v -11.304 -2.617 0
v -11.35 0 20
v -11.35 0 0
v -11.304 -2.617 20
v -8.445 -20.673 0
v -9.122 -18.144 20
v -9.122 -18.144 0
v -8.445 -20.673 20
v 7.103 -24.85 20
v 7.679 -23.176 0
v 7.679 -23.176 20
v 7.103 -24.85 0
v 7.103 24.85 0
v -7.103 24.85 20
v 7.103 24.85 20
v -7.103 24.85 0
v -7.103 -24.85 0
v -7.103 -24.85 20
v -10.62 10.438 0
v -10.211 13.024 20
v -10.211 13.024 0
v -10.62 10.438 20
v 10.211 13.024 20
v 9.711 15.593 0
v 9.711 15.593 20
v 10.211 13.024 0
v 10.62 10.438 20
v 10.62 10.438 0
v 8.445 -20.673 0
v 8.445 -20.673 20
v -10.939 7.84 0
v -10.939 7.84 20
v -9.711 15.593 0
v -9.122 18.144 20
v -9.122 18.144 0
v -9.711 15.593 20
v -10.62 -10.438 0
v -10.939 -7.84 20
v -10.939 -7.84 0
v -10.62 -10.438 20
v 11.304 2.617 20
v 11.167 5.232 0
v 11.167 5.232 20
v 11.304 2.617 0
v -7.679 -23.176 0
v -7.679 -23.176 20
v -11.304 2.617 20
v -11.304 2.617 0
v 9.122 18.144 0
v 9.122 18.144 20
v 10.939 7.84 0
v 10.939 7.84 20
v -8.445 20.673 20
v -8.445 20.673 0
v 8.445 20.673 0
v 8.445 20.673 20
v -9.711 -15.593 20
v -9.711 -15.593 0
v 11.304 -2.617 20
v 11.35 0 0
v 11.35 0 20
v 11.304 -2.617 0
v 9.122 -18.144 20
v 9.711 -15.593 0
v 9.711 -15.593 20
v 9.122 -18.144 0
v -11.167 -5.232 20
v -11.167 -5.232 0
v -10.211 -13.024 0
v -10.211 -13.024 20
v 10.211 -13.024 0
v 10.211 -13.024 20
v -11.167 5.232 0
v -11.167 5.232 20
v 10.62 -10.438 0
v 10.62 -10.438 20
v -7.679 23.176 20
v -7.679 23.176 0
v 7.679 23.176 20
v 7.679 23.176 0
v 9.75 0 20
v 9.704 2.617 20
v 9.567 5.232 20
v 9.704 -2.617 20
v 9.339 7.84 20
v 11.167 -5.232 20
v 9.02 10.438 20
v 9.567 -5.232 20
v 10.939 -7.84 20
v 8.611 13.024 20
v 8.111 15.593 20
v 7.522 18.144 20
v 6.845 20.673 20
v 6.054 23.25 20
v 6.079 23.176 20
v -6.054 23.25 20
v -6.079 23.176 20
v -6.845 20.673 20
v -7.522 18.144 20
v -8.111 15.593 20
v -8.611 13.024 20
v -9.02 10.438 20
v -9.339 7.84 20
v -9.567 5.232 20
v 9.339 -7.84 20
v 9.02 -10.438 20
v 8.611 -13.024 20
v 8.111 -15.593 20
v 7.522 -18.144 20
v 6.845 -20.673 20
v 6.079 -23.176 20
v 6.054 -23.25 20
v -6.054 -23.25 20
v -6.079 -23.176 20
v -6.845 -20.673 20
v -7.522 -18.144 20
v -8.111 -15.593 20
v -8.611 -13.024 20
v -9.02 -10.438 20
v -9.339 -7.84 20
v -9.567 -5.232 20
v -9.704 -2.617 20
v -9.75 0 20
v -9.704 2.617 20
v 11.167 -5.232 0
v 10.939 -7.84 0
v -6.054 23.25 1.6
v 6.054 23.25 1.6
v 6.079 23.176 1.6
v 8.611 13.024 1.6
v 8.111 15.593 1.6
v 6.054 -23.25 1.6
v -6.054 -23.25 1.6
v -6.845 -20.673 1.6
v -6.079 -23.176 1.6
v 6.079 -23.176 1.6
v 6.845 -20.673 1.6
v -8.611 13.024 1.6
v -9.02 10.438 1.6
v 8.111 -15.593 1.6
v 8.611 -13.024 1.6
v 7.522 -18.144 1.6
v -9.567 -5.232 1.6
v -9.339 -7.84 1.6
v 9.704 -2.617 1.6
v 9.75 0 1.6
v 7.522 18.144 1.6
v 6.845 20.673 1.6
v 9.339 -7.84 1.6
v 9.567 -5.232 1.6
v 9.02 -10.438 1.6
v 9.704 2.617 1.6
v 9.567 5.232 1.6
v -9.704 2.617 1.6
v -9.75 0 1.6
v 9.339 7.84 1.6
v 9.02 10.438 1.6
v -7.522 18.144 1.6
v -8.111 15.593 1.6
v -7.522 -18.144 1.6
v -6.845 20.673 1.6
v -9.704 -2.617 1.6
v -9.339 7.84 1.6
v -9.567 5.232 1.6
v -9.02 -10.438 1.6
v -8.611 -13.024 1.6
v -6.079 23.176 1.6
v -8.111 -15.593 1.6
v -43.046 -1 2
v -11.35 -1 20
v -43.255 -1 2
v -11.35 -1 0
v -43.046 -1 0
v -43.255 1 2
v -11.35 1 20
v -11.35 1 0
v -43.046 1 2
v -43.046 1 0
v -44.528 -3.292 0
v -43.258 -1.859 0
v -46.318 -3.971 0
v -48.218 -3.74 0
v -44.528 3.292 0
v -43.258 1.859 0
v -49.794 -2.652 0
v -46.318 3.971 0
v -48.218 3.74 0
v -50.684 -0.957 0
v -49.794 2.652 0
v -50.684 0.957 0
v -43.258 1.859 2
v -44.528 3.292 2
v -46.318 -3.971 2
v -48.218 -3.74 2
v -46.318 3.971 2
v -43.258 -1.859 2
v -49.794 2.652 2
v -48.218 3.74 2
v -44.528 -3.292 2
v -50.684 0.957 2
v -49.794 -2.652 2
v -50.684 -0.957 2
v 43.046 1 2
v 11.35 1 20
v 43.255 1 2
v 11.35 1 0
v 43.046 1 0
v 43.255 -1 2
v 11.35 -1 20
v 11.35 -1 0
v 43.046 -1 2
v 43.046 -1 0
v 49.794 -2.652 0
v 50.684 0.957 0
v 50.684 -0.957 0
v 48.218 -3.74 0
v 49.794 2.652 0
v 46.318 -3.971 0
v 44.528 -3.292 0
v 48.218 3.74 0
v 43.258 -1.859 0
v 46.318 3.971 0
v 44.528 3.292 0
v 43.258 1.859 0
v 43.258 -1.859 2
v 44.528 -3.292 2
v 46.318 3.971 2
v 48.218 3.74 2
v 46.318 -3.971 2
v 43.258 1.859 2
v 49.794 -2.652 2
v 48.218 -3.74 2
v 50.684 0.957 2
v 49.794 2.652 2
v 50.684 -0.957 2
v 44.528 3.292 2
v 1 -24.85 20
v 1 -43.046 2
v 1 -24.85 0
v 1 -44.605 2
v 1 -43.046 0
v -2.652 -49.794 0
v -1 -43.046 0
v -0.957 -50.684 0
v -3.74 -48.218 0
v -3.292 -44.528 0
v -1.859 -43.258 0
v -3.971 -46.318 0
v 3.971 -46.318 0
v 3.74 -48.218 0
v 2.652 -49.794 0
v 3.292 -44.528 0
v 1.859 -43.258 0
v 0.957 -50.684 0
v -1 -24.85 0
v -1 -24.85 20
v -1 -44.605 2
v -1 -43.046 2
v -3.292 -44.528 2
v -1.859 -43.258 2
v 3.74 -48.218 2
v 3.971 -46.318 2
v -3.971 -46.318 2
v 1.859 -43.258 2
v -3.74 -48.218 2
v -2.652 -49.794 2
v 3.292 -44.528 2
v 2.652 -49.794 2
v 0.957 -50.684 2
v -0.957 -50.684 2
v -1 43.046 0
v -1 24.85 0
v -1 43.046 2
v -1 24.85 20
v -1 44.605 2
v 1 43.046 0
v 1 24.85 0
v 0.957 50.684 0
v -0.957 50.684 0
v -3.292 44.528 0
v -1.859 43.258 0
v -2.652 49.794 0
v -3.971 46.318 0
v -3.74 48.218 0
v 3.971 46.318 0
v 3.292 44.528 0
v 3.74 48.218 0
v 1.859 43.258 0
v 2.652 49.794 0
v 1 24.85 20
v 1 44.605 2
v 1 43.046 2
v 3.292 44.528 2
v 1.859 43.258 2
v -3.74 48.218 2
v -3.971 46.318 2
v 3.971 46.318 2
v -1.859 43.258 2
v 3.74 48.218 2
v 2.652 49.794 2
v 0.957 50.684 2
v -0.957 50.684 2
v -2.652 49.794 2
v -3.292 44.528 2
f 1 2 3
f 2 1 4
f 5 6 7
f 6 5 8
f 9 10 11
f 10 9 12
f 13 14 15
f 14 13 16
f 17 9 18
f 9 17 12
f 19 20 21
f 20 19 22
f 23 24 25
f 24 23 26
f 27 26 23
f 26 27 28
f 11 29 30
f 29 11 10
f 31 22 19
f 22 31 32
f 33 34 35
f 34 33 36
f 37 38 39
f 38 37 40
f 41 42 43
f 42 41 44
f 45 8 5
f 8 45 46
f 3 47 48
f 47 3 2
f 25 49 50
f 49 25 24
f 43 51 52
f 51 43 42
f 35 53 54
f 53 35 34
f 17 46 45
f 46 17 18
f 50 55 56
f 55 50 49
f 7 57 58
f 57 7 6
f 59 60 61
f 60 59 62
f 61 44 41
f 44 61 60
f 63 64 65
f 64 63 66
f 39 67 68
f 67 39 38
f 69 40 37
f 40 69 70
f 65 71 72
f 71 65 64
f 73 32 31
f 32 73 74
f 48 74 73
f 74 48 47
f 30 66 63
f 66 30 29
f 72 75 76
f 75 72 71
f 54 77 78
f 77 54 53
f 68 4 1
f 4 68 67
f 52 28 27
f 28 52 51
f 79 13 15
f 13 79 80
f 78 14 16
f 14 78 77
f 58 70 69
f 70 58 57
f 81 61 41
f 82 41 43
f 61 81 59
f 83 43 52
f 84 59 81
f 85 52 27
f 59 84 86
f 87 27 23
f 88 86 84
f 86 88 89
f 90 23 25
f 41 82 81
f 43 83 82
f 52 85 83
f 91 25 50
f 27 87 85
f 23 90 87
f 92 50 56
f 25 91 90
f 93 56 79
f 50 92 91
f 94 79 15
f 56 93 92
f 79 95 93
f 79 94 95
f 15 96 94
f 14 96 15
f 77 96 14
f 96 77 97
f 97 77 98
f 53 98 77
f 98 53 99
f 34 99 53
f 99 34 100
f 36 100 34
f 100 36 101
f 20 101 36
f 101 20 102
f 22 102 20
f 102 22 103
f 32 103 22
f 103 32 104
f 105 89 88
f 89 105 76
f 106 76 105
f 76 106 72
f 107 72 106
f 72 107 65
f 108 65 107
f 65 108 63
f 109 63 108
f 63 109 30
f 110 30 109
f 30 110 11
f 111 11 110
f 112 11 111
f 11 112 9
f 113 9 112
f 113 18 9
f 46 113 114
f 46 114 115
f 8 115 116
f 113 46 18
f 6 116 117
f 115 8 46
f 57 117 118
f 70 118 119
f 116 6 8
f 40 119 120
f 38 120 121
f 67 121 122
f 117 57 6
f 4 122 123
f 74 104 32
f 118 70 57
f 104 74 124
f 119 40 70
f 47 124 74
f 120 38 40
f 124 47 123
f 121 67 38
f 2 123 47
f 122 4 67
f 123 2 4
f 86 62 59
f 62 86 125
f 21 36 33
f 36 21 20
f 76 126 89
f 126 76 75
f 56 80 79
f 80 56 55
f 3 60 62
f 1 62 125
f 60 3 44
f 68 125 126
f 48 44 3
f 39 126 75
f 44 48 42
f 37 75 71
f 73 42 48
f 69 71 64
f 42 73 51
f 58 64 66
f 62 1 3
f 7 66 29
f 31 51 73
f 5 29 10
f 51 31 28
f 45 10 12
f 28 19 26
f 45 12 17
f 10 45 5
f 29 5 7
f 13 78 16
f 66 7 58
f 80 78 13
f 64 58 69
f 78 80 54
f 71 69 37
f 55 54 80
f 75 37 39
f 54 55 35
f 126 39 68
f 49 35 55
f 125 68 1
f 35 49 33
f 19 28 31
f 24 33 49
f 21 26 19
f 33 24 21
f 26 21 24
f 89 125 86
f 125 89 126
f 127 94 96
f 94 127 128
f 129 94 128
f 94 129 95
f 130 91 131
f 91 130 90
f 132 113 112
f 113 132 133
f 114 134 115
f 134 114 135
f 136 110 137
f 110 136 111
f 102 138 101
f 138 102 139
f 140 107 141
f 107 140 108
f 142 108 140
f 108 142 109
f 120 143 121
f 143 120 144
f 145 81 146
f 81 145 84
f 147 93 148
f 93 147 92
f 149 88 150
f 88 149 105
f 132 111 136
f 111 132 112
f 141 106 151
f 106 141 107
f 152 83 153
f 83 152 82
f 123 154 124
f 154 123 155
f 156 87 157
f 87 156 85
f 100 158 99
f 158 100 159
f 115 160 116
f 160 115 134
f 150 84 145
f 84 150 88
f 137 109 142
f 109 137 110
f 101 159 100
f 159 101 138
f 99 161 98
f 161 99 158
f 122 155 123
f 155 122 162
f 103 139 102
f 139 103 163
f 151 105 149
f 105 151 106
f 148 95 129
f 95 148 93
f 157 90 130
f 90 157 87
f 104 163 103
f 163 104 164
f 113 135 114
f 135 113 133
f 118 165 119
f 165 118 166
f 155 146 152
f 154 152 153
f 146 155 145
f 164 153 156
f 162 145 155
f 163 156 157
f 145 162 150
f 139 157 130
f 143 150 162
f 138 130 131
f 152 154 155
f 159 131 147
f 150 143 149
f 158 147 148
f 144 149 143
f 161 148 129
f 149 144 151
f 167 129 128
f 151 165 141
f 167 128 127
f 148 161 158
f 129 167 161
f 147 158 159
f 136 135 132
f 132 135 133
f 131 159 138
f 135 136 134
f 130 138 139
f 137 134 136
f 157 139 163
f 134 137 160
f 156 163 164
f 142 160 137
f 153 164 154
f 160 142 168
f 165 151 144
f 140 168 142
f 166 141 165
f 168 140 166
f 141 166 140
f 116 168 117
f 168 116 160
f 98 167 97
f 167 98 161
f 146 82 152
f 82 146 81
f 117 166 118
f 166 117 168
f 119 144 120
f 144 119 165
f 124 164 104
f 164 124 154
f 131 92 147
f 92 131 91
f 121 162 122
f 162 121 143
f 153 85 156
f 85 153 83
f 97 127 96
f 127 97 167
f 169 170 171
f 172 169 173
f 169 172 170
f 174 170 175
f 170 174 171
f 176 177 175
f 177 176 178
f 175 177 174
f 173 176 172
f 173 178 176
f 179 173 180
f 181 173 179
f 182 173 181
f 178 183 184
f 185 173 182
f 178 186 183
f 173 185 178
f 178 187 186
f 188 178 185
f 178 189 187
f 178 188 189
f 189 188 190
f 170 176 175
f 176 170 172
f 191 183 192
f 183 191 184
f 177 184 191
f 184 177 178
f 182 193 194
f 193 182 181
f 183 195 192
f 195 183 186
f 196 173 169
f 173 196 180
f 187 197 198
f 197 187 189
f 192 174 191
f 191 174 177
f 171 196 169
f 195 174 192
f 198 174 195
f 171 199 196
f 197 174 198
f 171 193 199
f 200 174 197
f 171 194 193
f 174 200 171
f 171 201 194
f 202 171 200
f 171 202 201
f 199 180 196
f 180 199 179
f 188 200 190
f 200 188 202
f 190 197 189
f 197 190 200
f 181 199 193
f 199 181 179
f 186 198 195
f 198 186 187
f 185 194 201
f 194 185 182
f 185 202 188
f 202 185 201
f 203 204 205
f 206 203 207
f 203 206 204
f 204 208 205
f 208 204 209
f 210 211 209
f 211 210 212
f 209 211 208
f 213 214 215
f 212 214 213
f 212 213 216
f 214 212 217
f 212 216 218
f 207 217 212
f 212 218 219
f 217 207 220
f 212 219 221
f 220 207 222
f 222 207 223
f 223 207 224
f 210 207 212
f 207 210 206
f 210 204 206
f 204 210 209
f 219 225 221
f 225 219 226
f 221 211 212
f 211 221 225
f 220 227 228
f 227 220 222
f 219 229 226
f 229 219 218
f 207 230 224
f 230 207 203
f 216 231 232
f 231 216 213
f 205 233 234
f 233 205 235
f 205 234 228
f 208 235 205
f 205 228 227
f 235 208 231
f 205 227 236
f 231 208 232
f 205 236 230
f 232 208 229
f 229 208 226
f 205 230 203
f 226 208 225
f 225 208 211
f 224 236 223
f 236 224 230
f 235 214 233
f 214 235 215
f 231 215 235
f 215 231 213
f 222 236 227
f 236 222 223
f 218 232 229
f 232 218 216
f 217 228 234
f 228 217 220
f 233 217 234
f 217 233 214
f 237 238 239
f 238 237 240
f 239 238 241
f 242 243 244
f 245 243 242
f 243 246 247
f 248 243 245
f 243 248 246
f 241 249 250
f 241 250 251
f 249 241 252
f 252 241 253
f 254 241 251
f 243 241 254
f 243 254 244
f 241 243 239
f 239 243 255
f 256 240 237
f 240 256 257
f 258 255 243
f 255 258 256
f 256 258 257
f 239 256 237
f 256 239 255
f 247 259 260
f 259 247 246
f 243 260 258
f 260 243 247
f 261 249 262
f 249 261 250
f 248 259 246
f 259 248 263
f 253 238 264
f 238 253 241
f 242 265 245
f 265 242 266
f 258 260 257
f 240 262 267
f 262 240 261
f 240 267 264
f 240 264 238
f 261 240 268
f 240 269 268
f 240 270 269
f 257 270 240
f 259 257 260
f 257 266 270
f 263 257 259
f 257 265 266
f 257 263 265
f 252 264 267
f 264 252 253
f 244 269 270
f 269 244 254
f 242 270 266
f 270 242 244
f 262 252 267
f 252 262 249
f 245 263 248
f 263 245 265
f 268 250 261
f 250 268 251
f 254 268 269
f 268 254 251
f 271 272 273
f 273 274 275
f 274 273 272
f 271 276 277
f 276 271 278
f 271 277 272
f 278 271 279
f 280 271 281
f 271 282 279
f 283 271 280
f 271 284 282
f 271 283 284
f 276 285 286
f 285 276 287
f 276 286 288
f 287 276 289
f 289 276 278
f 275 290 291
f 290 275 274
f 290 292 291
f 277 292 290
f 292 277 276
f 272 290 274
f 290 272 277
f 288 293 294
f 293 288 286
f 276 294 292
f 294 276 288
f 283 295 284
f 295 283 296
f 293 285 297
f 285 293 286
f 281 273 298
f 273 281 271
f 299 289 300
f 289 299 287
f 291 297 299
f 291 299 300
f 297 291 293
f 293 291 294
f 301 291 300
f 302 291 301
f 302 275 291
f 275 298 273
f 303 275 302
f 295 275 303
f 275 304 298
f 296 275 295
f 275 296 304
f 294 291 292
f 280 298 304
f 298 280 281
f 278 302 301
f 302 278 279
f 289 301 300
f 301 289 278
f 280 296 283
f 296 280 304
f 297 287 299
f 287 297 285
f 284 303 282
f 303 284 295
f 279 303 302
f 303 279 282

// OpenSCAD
// Stand for RICOH THETA SC


/* [Basic parameters] */

// Height of the stand
height = 20;          // [5:95]
// Wall thickness
stand_thickness = 1.6;  // 0.3
// Leg spread
base_r = 100;            // [50:200]
// additional clearance for inserting camera
clearance = 1.5;         // [0:5]

/* [Camera Dimensions] */

//Radius of the theta body
tetha_r = 75;
//Thickness of theta
tetha_depth = 18;
//Width of theta
tetha_width = 45;


module theta_profile(extra=0) {
    r = tetha_r; 
    r_dist = tetha_depth + extra;
    w = tetha_width + extra;
    
    intersection() {
        translate([-r+r_dist/2,0,0])
        circle(r=r, $fn=180);
    
        translate([r-r_dist/2,0,0])
        circle(r=r, $fn=180);
        
        square([r_dist,w], center=true);
    }        
}

module theta_body(extra=0, height=10) {
    linear_extrude(height=height) {
        theta_profile(extra=extra);
    }
}

module theta_shell(thickness=2, height=130, extra=0) {
    
    difference() {    
        theta_body(extra=2*thickness+extra, height=height);
    
        translate([0,0,thickness])
        theta_body(extra=extra, height=height);
    }    
}

module theta_mount_leg(height=20, len=20, thickness=2) {
    
    translate([0,-thickness/2,0])
    rotate([90,0,180])
    linear_extrude(height=thickness) {
        polygon(points=[[0,0],[0,height],[len,0]]);
    }
    
    translate([-len,0,0])
    cylinder(r=thickness*2, h=thickness);

}

module theta_stand(extra=0, height=20, thickness=2, base_r=70) {
    r_dist = tetha_depth+extra;
    w = tetha_width+extra;
    
    l1 = (base_r - r_dist) / 2 - 2*thickness - thickness;
    l2 = (base_r - w) / 2 - 2*thickness - thickness;
    
    theta_shell(height=height, thickness=thickness, extra=extra);
    
    translate([-r_dist/2-thickness,0,0])
    theta_mount_leg(height=height, len=l1);

    translate([r_dist/2+thickness,0,0])
    rotate([0,0,180])
    theta_mount_leg(height=height, len=l1);
    
    translate([0,-w/2-thickness,0])
    rotate([0,0,90])
    theta_mount_leg(height=height, len=l2);

    translate([0,w/2+thickness,0])
    rotate([0,0,-90])
    theta_mount_leg(height=height, len=l2);
    
    
}

theta_stand(extra=clearance, height=height, thickness=stand_thickness, base_r=base_r);
